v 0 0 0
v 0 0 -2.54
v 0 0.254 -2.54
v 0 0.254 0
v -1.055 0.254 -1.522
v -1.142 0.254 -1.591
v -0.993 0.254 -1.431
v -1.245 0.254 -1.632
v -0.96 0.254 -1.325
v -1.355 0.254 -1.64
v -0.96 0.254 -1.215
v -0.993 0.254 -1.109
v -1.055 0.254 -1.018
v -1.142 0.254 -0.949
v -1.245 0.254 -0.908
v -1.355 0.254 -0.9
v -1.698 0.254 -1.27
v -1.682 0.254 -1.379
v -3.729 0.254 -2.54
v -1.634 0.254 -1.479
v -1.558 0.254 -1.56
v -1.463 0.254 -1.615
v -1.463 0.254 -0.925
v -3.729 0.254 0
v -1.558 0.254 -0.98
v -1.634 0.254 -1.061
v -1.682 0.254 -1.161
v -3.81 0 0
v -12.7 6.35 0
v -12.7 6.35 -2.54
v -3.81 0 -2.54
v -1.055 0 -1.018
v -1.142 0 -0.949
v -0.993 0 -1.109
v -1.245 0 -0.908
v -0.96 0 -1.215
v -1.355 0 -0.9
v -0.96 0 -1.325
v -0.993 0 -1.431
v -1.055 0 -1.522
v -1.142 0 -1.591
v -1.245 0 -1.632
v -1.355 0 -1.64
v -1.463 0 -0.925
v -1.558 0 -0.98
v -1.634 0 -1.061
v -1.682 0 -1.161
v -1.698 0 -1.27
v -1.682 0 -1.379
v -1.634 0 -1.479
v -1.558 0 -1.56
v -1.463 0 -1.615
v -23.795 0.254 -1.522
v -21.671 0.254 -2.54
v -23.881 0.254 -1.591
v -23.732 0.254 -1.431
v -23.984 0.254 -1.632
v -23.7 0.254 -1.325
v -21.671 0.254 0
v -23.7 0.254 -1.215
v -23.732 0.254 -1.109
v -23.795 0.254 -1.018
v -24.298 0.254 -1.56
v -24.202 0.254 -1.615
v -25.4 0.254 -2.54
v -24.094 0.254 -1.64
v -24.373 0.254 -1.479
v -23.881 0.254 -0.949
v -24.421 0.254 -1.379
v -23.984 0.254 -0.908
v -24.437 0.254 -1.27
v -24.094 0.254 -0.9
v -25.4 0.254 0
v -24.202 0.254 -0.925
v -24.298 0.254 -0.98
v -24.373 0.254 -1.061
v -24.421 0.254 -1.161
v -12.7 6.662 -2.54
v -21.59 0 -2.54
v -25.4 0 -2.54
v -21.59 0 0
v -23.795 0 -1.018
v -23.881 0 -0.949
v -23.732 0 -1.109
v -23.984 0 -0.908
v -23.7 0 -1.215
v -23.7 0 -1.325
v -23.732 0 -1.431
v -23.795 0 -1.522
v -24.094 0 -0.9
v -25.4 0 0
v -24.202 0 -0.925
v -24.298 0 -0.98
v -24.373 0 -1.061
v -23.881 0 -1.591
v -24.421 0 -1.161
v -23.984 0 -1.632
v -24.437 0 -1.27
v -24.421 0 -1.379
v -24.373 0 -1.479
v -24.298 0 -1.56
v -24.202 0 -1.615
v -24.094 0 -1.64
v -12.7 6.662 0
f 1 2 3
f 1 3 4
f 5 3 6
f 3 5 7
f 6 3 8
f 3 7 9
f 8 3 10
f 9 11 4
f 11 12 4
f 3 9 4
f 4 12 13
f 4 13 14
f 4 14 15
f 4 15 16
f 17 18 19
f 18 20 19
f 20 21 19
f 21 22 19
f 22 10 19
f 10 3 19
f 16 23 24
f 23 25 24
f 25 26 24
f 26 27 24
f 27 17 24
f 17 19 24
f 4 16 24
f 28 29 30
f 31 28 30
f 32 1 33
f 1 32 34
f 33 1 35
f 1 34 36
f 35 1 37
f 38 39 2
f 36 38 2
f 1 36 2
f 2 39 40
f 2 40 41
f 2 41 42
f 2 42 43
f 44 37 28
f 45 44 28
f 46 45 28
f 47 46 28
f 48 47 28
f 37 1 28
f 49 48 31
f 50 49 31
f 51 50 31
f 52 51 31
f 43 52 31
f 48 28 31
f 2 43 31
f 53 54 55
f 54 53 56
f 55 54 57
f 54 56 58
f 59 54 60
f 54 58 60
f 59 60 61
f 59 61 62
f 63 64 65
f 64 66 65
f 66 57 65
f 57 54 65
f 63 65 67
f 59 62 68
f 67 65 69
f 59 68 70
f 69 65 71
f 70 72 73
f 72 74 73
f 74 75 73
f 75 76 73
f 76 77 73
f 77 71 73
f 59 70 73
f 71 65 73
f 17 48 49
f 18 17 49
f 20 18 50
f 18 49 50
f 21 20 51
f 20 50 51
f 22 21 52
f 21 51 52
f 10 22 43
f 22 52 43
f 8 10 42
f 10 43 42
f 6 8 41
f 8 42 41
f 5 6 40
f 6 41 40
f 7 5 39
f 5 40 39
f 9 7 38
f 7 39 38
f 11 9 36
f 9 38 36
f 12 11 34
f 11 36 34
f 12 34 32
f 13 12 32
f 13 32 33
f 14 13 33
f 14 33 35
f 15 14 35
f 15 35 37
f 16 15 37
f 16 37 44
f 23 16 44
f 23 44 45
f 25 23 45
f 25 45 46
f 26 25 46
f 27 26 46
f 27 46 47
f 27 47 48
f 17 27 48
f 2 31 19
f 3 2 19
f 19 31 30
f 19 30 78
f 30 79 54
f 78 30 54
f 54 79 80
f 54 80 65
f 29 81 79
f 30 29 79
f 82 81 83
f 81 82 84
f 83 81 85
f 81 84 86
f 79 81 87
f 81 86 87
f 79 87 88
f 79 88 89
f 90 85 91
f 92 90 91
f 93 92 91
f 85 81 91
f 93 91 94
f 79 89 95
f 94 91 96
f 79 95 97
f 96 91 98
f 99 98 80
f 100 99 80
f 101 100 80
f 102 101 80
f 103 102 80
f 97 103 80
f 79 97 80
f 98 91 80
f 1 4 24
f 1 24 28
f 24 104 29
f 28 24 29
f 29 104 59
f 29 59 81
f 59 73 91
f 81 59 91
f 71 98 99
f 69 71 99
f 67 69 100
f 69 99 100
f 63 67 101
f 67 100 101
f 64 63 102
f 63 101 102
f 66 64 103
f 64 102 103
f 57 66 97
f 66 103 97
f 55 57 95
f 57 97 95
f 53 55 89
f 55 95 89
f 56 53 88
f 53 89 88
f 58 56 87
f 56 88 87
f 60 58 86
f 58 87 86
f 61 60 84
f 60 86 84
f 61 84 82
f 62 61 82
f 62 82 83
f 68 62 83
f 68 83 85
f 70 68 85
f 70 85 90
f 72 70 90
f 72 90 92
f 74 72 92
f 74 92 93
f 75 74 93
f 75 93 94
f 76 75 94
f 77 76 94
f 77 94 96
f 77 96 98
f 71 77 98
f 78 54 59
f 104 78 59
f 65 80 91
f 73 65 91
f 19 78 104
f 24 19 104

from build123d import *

# Parameters (mm, degrees)
SKETCH3_W                    = 2.54
SKETCH3_H                    = 0.254
F_69_0_0292_DIAMETER_HOLE1_D = 0.74168


with BuildPart() as part:
    # Sweep1: sweep along a path in Sketch2
    with BuildLine(Plane.XY) as sweep1_path:
        Line((0, 0), (-3.81, 0))
        Line((-3.81, 0), (-12.7, 6.35))
        Line((-12.7, 6.35), (-21.59, 0))
        Line((-21.59, 0), (-25.4, 0))
    # Sketch3 → Sweep1 (sweep)
    with BuildSketch(Plane(origin=(0, 0, 0), x_dir=(0, 0, -1), z_dir=(1, 0, 0))):
        with Locations((1.27, 0.127)):
            Rectangle(SKETCH3_W, SKETCH3_H)
    sweep(path=sweep1_path.line, transition=Transition.RIGHT)

    # #69 (0.0292) Diameter Hole1 (through all)
    with Locations(Plane(origin=(0, 0.254, 0), x_dir=(1, 0, 0), z_dir=(0, 1, 0))):
        with Locations((-24.0665, 1.27), (-1.3271754, 1.27)):
            Hole(F_69_0_0292_DIAMETER_HOLE1_D / 2)


solid = part.part
